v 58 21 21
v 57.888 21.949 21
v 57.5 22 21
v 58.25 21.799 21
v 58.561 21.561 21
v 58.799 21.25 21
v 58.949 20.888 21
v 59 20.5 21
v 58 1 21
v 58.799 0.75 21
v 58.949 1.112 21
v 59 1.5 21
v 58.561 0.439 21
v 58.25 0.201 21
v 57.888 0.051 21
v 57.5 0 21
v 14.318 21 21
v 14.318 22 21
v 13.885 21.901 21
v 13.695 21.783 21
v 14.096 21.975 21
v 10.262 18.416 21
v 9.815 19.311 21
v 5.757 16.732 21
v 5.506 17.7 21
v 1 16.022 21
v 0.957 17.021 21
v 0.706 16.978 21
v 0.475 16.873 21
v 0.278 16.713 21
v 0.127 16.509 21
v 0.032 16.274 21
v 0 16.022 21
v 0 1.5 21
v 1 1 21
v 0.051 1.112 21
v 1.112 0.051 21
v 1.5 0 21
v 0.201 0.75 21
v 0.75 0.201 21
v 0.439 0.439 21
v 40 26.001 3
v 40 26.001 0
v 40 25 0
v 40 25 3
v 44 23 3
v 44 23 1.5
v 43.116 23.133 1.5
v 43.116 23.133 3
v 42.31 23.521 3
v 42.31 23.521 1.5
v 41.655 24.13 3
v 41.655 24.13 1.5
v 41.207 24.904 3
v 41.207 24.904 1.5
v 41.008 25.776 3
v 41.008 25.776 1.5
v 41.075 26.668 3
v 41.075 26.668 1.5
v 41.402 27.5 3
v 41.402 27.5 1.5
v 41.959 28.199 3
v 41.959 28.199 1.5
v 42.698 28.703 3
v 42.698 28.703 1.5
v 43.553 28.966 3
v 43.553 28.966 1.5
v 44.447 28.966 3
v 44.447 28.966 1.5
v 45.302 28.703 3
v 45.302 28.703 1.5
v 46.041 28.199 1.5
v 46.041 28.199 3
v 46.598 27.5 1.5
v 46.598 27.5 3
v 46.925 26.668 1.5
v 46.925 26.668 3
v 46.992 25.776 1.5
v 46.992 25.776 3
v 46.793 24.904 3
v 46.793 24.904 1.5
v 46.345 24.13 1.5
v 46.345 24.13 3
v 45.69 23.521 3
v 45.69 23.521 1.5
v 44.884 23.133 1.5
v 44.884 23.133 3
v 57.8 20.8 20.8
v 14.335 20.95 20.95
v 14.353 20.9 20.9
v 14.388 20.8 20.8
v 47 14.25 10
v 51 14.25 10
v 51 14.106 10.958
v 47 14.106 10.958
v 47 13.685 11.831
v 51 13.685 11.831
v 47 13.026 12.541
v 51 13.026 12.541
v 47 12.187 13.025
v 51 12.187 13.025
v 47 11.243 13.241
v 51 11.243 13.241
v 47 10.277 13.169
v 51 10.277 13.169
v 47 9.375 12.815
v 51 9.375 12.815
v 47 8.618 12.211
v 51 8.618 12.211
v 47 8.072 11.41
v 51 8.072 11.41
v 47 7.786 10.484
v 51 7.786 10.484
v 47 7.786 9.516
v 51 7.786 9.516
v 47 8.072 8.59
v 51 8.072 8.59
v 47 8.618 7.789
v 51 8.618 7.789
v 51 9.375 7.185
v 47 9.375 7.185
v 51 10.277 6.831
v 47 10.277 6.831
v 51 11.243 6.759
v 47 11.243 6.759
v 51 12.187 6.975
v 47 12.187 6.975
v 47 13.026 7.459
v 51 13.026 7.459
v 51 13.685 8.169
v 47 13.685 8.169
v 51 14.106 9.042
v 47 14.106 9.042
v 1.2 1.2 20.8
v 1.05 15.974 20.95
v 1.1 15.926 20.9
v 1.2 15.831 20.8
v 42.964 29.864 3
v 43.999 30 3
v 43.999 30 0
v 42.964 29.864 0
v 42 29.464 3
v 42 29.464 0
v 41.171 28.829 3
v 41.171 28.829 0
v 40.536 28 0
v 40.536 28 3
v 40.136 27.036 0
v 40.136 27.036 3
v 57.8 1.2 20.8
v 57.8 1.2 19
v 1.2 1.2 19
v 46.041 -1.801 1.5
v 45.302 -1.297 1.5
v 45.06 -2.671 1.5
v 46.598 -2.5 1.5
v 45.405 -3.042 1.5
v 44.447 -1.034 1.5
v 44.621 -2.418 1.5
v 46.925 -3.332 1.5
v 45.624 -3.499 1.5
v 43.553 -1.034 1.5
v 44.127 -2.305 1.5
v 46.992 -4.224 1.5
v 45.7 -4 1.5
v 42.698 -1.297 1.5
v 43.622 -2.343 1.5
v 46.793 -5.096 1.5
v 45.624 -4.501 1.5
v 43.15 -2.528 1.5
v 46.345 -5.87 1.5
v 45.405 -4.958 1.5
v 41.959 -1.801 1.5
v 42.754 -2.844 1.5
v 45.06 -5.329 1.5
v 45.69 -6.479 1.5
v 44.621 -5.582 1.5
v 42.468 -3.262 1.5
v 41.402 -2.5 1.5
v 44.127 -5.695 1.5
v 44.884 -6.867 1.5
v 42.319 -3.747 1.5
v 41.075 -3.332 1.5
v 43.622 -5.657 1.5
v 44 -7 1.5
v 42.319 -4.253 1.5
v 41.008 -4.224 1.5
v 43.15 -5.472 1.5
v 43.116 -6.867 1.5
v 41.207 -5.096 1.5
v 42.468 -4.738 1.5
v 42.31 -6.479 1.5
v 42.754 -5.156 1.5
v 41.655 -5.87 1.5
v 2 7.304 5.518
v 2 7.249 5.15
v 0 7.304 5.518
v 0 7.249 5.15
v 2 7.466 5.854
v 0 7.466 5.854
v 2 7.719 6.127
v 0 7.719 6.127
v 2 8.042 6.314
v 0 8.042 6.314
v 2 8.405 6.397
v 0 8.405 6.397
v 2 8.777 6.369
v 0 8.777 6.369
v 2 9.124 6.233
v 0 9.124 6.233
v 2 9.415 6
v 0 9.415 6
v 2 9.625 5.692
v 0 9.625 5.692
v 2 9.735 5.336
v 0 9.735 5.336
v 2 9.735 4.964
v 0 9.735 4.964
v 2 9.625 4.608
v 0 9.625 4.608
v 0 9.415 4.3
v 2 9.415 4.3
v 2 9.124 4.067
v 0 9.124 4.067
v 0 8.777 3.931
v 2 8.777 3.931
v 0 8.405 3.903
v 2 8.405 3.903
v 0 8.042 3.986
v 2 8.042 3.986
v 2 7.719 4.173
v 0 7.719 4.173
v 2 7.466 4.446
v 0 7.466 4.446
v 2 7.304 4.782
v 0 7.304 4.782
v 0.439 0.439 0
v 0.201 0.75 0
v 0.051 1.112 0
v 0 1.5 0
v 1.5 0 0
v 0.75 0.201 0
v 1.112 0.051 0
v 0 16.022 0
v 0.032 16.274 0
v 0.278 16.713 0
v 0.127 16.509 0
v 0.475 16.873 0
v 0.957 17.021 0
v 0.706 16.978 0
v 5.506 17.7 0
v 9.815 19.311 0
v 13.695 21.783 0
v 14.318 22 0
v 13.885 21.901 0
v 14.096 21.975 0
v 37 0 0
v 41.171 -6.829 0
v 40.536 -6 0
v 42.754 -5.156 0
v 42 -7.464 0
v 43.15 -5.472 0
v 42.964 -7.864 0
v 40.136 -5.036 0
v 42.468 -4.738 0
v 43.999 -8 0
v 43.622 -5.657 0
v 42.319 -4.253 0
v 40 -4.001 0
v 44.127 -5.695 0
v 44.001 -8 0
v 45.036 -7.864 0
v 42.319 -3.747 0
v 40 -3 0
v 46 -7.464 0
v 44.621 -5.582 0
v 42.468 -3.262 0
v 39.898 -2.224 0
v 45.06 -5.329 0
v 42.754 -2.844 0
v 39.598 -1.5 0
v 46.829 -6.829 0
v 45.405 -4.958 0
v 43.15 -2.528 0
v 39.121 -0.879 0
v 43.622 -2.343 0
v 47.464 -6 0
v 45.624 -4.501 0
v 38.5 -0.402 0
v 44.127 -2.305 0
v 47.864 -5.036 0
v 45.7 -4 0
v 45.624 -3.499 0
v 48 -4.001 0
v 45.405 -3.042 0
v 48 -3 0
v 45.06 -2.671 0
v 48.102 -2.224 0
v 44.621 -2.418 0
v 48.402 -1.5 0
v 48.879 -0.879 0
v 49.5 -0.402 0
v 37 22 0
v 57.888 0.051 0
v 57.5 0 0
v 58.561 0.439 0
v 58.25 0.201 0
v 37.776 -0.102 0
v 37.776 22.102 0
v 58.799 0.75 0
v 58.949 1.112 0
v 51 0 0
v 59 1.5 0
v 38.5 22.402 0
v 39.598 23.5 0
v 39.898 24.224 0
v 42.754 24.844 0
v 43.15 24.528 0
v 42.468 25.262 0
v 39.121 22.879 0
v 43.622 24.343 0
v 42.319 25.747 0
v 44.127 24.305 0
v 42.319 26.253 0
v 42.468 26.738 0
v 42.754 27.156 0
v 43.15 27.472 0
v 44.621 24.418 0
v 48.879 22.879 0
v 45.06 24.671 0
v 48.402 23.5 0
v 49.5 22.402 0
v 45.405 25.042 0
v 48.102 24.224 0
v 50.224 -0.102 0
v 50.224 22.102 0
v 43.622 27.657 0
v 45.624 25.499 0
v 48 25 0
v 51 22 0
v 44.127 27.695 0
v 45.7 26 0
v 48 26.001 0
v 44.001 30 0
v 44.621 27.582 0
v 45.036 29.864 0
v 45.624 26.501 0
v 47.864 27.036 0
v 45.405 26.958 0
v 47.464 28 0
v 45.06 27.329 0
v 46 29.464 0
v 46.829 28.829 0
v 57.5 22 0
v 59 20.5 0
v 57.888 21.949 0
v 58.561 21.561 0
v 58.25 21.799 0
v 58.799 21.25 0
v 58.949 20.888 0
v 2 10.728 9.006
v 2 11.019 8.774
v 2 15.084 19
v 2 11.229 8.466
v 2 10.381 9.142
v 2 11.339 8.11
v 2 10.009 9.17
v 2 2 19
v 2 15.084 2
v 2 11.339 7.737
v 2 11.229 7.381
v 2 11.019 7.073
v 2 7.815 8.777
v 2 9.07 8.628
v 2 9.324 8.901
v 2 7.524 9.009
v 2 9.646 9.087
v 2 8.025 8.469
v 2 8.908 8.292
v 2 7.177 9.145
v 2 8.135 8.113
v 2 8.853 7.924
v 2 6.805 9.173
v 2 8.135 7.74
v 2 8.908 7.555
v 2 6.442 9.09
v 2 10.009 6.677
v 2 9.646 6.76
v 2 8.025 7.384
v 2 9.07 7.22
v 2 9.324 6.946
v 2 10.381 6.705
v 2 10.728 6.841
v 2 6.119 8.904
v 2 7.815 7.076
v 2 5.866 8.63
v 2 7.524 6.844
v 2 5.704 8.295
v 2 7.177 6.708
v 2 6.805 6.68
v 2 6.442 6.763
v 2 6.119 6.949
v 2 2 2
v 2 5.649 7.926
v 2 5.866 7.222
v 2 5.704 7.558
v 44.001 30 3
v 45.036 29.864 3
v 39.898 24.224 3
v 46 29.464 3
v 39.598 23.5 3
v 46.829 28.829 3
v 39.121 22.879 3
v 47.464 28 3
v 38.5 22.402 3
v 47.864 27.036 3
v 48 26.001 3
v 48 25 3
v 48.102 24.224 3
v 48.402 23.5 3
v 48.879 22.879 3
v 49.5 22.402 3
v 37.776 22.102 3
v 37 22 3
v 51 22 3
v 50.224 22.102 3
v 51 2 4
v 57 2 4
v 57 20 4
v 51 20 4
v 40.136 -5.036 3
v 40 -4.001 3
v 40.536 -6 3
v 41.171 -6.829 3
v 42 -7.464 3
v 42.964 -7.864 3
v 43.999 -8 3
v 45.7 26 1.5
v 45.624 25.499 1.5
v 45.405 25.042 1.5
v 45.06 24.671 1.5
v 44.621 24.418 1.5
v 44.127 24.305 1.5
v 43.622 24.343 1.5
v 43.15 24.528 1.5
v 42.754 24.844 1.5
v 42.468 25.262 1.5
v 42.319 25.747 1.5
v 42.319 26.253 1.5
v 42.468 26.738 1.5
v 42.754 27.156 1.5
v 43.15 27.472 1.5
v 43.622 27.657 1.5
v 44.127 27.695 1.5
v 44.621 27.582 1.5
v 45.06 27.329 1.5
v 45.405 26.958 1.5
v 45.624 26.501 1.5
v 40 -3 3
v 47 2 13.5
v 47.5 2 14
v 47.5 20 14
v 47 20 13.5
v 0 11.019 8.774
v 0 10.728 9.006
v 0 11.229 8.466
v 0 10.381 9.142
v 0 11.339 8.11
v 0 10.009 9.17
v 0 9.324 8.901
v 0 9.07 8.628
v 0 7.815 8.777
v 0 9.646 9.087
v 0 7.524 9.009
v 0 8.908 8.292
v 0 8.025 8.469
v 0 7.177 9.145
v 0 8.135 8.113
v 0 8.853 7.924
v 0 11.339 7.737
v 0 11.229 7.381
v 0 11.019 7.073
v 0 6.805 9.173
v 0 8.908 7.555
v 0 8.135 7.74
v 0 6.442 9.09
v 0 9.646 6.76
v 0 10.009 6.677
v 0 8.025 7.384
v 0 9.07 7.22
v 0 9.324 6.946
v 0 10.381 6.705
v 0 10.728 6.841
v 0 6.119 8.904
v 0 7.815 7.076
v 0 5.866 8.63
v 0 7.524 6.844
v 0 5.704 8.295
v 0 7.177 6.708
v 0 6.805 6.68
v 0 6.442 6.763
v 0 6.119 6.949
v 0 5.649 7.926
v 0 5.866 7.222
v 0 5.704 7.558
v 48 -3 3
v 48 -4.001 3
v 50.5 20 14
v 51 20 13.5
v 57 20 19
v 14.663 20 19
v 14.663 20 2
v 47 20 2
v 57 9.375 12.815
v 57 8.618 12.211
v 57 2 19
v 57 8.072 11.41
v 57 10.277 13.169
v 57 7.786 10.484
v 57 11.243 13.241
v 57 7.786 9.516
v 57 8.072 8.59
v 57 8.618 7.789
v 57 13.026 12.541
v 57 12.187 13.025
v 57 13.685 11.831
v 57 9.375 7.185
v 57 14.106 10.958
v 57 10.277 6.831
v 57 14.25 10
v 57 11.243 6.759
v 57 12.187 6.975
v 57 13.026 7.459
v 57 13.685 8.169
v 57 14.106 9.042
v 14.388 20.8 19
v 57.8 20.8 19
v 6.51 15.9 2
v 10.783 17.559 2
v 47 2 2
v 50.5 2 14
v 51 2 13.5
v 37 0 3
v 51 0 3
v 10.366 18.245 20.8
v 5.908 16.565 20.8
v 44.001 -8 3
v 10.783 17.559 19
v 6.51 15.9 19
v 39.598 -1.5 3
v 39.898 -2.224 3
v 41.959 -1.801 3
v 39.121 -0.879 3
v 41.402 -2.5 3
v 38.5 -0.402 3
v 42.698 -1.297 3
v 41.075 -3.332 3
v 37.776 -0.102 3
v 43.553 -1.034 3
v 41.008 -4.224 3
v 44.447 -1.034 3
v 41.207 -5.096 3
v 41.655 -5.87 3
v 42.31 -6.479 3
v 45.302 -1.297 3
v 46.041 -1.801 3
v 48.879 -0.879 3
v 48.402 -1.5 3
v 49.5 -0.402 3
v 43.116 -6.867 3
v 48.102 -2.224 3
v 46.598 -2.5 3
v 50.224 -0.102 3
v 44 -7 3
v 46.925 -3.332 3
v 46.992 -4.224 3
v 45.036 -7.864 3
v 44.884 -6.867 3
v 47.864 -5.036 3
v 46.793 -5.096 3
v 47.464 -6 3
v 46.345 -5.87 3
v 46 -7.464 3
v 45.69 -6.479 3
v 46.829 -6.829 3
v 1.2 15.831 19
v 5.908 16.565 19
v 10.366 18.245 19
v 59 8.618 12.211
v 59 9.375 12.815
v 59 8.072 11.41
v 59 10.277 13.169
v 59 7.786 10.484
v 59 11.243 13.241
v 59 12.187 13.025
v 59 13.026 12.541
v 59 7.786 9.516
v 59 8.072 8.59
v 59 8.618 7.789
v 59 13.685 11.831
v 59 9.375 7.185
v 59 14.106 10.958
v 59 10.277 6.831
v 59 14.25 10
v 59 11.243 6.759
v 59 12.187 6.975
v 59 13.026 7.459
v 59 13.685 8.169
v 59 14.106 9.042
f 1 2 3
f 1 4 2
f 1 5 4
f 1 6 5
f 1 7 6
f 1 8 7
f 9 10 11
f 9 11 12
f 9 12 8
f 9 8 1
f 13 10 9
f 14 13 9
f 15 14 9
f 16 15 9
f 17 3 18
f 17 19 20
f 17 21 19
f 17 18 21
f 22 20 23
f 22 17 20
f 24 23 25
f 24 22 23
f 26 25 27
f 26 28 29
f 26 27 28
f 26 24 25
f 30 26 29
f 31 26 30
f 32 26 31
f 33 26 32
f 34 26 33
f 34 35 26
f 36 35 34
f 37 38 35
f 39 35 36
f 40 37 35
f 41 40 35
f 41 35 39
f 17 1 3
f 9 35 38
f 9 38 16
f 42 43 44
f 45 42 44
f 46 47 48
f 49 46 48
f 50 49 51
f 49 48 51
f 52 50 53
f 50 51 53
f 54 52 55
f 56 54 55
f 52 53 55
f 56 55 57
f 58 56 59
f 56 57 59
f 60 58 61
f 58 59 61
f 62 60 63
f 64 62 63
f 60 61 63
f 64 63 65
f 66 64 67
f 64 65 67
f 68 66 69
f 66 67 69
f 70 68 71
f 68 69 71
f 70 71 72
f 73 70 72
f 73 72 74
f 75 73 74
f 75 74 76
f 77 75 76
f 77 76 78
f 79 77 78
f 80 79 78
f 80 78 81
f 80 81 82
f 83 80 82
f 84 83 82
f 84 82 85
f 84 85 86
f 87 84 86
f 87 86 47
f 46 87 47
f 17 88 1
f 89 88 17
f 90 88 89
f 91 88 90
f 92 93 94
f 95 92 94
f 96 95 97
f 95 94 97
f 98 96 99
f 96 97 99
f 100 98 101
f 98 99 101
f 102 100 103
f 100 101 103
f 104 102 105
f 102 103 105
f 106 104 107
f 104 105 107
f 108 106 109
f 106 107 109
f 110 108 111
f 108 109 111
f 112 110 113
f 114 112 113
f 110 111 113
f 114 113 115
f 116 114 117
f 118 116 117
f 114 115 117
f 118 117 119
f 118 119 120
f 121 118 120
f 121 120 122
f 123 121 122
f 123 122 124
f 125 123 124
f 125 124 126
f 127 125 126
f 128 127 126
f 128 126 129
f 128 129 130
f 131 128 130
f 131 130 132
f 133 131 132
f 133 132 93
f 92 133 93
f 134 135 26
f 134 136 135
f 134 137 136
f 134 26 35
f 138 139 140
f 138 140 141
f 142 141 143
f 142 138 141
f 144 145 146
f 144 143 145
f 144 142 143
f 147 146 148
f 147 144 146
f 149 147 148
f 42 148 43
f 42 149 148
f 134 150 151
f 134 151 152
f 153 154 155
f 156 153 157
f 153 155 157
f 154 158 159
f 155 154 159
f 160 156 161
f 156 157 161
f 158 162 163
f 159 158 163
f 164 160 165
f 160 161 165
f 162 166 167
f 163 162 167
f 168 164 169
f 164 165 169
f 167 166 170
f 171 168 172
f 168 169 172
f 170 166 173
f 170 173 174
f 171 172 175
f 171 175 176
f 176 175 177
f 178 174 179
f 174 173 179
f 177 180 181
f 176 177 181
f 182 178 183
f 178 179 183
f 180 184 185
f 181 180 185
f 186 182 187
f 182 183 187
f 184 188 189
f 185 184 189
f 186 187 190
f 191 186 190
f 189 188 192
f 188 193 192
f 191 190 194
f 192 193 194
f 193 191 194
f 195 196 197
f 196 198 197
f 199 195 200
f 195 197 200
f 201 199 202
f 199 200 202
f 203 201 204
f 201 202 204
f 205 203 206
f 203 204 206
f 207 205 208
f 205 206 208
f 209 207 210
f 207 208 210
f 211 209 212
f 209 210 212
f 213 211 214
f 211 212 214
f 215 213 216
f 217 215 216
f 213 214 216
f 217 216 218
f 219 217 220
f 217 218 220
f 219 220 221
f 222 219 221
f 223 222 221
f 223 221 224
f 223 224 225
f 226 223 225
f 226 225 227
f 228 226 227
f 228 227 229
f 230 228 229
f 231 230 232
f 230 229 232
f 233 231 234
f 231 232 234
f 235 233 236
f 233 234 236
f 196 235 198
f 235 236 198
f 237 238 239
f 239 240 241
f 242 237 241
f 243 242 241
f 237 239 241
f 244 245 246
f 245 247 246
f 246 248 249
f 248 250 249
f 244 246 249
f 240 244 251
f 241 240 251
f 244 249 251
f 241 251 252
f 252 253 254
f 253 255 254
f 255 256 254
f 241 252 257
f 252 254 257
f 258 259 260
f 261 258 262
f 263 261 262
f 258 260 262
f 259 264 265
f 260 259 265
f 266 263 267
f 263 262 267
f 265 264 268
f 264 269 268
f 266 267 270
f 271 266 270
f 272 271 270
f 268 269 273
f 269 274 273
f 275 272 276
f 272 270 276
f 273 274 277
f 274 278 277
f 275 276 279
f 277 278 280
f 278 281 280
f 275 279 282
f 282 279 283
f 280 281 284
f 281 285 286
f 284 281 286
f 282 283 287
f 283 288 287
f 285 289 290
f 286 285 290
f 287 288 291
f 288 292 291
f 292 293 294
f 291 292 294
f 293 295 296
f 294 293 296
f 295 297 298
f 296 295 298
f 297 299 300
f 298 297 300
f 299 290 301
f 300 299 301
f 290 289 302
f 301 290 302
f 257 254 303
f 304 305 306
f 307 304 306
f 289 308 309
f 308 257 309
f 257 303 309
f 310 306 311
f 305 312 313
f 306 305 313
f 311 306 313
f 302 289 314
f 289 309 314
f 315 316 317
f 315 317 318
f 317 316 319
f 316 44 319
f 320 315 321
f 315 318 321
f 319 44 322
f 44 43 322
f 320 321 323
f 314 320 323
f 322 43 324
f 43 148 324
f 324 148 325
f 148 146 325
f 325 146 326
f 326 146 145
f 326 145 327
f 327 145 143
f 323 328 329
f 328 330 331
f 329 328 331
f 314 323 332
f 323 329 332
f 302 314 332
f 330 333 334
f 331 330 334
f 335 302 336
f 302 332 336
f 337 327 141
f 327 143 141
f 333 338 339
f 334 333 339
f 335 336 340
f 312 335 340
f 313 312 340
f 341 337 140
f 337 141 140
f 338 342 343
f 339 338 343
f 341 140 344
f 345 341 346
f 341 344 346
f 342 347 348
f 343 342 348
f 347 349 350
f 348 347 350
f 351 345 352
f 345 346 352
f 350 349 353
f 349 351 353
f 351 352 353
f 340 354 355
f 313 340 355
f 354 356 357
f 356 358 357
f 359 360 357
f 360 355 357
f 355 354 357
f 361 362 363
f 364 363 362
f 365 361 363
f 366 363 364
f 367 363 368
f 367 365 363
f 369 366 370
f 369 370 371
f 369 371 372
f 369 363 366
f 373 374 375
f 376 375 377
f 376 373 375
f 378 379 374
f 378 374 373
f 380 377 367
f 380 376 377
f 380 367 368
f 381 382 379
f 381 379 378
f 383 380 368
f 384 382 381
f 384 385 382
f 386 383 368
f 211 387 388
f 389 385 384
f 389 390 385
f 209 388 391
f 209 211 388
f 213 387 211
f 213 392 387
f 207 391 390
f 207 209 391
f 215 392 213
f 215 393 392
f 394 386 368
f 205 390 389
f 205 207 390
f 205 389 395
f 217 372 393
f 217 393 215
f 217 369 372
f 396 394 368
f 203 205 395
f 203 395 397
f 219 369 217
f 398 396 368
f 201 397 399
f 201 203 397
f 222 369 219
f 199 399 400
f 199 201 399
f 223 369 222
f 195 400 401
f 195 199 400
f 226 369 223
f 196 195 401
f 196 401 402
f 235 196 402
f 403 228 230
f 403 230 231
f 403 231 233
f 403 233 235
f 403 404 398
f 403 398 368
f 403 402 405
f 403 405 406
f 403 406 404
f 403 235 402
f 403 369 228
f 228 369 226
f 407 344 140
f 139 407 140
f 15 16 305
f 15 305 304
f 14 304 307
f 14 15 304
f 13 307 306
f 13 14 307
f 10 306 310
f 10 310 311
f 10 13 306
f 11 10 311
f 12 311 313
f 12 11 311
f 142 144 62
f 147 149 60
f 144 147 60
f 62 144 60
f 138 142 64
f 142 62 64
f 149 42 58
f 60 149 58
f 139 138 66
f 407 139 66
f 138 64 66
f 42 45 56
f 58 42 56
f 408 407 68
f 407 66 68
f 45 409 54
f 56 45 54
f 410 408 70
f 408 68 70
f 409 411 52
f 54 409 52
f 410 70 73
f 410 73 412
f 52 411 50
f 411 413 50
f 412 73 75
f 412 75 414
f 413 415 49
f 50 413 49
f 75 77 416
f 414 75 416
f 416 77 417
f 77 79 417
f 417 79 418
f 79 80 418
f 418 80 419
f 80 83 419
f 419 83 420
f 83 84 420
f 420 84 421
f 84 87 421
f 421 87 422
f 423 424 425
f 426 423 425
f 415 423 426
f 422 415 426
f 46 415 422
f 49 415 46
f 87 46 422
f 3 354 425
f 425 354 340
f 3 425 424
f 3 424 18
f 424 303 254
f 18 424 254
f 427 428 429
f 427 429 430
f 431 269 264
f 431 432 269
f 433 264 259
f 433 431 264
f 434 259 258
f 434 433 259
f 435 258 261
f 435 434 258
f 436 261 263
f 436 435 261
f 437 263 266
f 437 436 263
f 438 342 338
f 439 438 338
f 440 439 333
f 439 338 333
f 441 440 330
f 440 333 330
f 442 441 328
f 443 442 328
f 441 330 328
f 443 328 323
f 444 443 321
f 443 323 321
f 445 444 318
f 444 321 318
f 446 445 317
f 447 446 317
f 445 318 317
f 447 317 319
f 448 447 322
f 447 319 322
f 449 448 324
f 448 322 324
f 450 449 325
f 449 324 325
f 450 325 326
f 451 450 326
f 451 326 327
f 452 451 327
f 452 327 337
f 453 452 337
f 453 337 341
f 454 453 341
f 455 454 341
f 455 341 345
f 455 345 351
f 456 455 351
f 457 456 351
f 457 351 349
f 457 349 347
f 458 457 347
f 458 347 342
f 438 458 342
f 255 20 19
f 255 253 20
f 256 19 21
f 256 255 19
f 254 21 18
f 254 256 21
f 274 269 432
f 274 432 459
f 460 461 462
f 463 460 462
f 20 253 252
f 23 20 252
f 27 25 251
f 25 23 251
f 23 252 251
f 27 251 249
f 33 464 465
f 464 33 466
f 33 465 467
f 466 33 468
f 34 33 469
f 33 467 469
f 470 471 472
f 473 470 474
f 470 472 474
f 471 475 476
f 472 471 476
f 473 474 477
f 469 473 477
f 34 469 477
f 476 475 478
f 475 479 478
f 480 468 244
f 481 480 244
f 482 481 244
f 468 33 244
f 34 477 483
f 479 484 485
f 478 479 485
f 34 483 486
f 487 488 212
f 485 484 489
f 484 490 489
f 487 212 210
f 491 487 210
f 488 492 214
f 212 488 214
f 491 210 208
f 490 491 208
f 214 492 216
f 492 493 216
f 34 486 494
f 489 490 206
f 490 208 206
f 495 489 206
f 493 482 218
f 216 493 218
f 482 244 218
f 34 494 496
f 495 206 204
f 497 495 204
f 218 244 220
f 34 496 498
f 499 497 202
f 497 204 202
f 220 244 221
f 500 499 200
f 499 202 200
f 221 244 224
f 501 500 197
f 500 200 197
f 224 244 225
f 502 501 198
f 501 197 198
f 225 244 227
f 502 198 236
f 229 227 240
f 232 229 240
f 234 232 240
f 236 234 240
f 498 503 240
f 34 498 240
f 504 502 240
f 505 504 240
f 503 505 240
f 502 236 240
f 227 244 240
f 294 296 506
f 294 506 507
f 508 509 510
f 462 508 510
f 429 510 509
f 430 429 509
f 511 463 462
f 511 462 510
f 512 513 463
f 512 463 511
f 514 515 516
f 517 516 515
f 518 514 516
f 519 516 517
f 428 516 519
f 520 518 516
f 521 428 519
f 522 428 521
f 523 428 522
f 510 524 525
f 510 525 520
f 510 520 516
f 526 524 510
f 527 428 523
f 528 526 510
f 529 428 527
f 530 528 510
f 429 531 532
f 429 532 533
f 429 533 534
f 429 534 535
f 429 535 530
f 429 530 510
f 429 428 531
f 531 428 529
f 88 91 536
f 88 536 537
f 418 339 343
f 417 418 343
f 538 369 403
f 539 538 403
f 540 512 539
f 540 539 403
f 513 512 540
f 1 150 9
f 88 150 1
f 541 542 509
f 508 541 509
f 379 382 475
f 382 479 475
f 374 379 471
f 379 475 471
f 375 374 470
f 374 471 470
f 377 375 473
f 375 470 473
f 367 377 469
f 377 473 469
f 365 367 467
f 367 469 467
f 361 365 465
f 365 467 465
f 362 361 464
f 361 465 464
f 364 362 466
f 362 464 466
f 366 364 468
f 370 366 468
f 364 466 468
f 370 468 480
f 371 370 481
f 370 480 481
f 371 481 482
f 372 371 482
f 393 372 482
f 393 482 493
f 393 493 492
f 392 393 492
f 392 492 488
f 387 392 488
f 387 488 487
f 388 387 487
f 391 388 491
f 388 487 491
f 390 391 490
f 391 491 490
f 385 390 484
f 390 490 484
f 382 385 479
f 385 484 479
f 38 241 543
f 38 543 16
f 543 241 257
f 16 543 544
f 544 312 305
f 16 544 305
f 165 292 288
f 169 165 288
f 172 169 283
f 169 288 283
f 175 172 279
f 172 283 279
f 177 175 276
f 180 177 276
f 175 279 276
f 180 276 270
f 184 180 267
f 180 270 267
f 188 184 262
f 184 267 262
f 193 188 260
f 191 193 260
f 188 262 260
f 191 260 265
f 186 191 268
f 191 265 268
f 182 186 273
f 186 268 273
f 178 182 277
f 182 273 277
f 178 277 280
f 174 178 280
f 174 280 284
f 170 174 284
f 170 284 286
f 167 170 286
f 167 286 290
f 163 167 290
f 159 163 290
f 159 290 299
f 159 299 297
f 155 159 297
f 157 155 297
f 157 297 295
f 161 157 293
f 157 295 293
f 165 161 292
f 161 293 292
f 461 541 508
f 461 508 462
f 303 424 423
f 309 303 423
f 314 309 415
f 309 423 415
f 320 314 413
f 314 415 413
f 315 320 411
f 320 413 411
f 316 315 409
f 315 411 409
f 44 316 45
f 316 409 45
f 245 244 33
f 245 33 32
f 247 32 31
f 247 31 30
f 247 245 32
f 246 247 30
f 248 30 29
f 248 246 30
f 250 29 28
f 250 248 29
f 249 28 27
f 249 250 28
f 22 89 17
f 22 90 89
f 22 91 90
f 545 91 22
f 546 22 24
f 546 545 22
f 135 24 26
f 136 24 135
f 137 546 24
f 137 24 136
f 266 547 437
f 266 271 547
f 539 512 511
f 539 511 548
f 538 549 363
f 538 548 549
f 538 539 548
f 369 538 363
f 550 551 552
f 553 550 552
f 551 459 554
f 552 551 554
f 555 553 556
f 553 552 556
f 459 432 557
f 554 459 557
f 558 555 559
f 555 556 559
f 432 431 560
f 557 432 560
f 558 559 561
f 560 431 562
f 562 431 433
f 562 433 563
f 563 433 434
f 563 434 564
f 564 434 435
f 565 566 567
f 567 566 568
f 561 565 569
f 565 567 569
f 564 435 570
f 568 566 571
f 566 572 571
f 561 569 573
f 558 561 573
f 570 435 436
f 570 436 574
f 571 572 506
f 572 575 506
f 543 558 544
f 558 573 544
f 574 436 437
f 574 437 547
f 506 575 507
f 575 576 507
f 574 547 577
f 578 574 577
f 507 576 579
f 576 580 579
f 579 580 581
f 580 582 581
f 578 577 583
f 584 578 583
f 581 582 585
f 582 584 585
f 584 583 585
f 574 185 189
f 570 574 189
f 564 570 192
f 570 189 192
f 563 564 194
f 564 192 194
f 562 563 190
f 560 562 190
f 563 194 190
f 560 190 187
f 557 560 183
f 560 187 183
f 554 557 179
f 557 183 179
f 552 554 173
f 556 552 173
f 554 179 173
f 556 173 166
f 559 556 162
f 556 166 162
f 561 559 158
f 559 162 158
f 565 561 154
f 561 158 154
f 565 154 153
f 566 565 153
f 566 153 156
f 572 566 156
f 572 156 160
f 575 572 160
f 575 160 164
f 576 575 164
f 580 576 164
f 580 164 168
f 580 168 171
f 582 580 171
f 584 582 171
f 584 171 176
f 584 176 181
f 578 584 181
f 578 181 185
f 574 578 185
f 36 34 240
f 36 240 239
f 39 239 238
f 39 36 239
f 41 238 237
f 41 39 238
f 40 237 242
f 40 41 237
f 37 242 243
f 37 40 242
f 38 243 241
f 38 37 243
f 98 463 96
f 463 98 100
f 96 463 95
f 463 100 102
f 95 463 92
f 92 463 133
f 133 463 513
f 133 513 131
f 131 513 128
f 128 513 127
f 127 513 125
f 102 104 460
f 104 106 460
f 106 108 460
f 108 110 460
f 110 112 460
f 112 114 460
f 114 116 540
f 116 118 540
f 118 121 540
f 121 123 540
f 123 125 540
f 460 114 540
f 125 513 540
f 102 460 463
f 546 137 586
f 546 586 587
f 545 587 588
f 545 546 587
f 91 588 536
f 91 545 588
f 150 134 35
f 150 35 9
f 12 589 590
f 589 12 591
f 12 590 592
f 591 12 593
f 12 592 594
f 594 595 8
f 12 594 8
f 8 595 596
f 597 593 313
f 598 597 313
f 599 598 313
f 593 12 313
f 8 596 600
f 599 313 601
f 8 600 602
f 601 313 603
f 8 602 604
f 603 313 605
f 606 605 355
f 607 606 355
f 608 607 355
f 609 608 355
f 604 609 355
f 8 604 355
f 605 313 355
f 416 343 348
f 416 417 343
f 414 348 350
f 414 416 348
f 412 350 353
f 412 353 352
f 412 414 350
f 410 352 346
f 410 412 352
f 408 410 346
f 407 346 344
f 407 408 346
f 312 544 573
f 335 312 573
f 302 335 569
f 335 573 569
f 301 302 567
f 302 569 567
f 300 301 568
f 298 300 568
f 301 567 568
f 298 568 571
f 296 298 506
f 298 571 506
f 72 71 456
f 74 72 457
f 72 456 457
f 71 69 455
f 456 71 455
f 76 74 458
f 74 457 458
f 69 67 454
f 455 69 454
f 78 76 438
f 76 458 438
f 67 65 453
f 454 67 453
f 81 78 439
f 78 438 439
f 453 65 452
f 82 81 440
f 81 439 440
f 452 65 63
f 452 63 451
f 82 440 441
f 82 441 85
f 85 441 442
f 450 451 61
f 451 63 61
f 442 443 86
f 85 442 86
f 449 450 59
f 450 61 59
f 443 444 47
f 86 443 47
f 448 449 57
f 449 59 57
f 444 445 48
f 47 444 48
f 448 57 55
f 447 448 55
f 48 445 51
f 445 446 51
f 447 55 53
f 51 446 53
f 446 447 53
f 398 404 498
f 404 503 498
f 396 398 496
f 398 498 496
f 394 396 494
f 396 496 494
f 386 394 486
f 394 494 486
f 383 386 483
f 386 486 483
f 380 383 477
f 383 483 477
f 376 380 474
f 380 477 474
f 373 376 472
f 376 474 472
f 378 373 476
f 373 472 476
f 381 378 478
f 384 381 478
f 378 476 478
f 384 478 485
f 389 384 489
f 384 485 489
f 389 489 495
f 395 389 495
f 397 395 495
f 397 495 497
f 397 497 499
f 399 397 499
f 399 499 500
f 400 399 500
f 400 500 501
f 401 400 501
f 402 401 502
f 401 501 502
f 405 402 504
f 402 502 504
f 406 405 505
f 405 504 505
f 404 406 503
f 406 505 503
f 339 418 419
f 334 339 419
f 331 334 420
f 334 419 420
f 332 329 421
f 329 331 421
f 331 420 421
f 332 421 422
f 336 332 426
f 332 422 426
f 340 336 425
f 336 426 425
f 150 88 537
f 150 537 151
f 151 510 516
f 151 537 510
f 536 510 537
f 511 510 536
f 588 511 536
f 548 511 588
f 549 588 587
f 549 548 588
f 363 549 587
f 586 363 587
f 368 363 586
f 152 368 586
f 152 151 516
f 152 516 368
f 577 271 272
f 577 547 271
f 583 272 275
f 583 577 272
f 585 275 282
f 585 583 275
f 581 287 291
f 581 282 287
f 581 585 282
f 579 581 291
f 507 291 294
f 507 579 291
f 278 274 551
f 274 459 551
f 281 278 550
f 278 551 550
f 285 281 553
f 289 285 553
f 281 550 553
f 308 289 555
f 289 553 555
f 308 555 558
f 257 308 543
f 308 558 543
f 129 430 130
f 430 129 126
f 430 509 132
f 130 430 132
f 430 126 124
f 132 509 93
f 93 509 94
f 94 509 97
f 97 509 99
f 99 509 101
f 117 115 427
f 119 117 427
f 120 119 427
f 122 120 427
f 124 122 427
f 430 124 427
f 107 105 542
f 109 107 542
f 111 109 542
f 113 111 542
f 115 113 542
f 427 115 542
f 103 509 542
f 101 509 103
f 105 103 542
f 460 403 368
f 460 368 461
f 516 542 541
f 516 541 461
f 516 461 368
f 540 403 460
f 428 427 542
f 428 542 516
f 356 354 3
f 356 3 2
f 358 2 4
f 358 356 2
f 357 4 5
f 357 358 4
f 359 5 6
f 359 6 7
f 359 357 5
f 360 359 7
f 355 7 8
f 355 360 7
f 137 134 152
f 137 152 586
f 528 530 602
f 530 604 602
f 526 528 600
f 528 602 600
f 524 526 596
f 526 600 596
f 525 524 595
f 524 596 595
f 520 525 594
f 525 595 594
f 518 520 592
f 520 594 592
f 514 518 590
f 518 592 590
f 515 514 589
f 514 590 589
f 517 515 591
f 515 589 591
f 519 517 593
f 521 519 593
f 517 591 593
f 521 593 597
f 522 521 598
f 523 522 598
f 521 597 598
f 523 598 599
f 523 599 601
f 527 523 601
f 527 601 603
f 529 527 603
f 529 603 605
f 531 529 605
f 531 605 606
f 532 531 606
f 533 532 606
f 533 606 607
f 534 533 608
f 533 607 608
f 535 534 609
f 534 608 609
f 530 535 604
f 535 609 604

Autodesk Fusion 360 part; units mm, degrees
sketch "Esquisse1" plane through (0, 0, 0) normal (0, 0, 1) x (1, 0, 0)
  line L0 (0, 0) -> (59, 0)
  line L1 (59, 0) -> (59, 22)
  line L2 (59, 22) -> (0, 22)
  line L3 (0, 22) -> (0, 0)
  line L4 (0, 0) -> (0, 17) construction
  line L5 (0, 17) -> (0, 39) construction
  arc A0 (0, 17) -> (13.9642, 22) centre (0, 39) ccw
  dimension "d1" = 22
  dimension "d2" = 59
  dimension "d3" = 17
  dimension "d4" = 22
extrude "Extrusion1" add sketch "Esquisse1" along normal blind 2 contours L0 L1 L2 L3 A0
sketch "Esquisse2" plane through (0, 0, 2) normal (0, 0, 1) x (-1, 0, 0)
  line L0 (0, 0) -> (-59, 0)
  line L1 (-59, 0) -> (-59, -22)
  line L2 (-59, -22) -> (-13.9642, -22)
  arc A0 (0, -17) -> (-13.9642, -22) centre (0, -39) ccw
  line L3 (0, -17) -> (0, 0)
  arc A1 (-2, -15.0835) -> (-14.6629, -20) centre (0, -39) ccw
  line L4 (-57, -20) -> (-14.6629, -20)
  line L5 (-57, -2) -> (-57, -20)
  line L6 (-2, -2) -> (-57, -2)
  line L7 (-2, -15.0835) -> (-2, -2)
  dimension "d7" = -2
extrude "Extrusion2" add sketch "Esquisse2" along normal blind 19
sketch "Esquisse3" plane through (0, 0, 0) normal (-1, 0, 0) x (0, -1, 0)
  line L0 (-17, 0) -> (0, 0)
  line L1 (0, 0) -> (0, 21)
  line L2 (0, 21) -> (-17, 21)
  line L3 (-17, 21) -> (-17, 0)
  line L4 (-17, 7) -> (0, 7) construction
  circle A0 centre (-8.5, 7) radius 1.85 construction
  circle A1 centre (-8.4986, 5.15) radius 1.25
  circle A2 centre (-6.8986, 7.9263) radius 1.25
  circle A3 centre (-10.1029, 7.9237) radius 1.25
  dimension "d11" = 7
  dimension "d12" = 3.7
  dimension "d13" = 2.5
  dimension "d15" = 360
extrude "Extrusion3" cut sketch "Esquisse3" against normal blind 2 contours A1 | A2 | A3
sketch "Esquisse5" plane through (59, 0, 0) normal (1, 0, 0) x (0, 1, 0)
  line L0 (0, 0) -> (22, 0)
  line L1 (22, 0) -> (22, 21)
  line L2 (22, 21) -> (0, 21)
  line L3 (0, 21) -> (0, 0)
  circle A0 centre (11, 10) radius 3.25
  circle A1 centre (11, 10) radius 2
  dimension "d24" = 6.5
  dimension "d28" = 11
  dimension "d29" = 10
  dimension "d36" = 4
sketch "Esquisse6" plane through (0, 0, 2) normal (0, 0, 1) x (-1, 0, 0)
  line L0 (-2, -2) -> (-57, -2)
  line L1 (-57, -2) -> (-57, -20)
  line L2 (-57, -20) -> (-14.6629, -20)
  arc A0 (-2, -15.0835) -> (-14.6629, -20) centre (0, -39) ccw
  line L3 (-2, -15.0835) -> (-2, -2)
  line L4 (-57, -20) -> (-47, -20)
  line L5 (-47, -20) -> (-47, -2)
  line L6 (-47, -2) -> (-57, -2)
  line L7 (-57, -2) -> (-57, -20)
  dimension "d25" = 10
extrude "Extrusion5" add sketch "Esquisse6" along normal blind 12 contours L0 L1 L2 L4 L5 L6 L7
extrude "Extrusion6" cut sketch "Esquisse5" against normal blind 19 contours A0 | A1
sketch "Esquisse7" plane through (0, 0, 14) normal (0, 0, 1) x (-1, 0, 0)
  line L0 (-57, -2) -> (-57, -20)
  line L1 (-57, -20) -> (-47, -20)
  line L2 (-47, -20) -> (-47, -2)
  line L3 (-57, -20) -> (-57, -2)
  line L4 (-57, -20) -> (-51, -20)
  line L5 (-51, -20) -> (-51, -2)
  line L6 (-51, -2) -> (-57, -2)
  line L7 (-57, -2) -> (-57, -20)
  line L8 (-47, -2) -> (-57, -2)
  dimension "d35" = 6
extrude "Extrusion7" cut sketch "Esquisse7" against normal blind 10 contours L0 L1 L3 L4 L5 L6 L7 L8
extrude "Extrusion8" cut sketch "Esquisse5" against normal blind 13 contours A1
sketch "Esquisse8" plane through (51, 0, 0) normal (1, 0, 0) x (0, 1, 0)
  line L0 (20, 14) -> (2, 14)
  line L1 (2, 14) -> (2, 4)
  line L2 (2, 4) -> (20, 4)
  line L3 (20, 4) -> (20, 14)
  circle A0 centre (11, 10) radius 3.25
sketch "Esquisse9" plane through (0, 0, 0) normal (0, 0, -1) x (1, 0, 0)
  line L0 (59, 0) -> (0, 0)
  line L1 (0, 0) -> (0, -17)
  arc A0 (13.9642, -22) -> (0, -17) centre (0, -39) ccw
  line L2 (13.9642, -22) -> (59, -22)
  line L3 (59, -22) -> (59, 0)
  line L4 (40, 0) -> (48, 0)
  line L5 (48, 0) -> (48, 8)
  line L6 (48, 8) -> (40, 8)
  line L7 (40, 8) -> (40, 0)
  line L8 (44, 0) -> (44, 8) construction
  line L9 (59, -11) -> (19, -11) construction
  line L10 (48, -22) -> (48, -30)
  line L11 (48, -30) -> (40, -30)
  line L12 (40, -30) -> (40, -22)
  line L13 (40, -22) -> (48, -22)
  circle A1 centre (44, 4) radius 1.7
  circle A2 centre (44, -26) radius 1.7
  dimension "d39" = 8
  dimension "d40" = 8
  dimension "d41" = 15
  dimension "d44" = 3.4
extrude "Extrusion9" add sketch "Esquisse9" against normal blind 3 contours L0 L4 L5 L6 L7 | L2 L10 L11 L12 L13
fillet "Congé1" radius 4 4 edges at (48, -8, 1.5) (40, -8, 1.5) (48, 30, 1.5) (40, 30, 1.5)
fillet "Congé2" radius 3 4 edges at (48, 0, 1.5) (48, 22, 1.5) (40, 22, 1.5) (40, 0, 1.5)
sketch "Esquisse10" plane through (0, 0, 21) normal (0, 0, 1) x (-1, 0, 0)
  line L0 (-2, -2) -> (-2, -15.0835)
  arc A0 (-2, -15.0835) -> (-14.6629, -20) centre (0, -39) ccw
  line L1 (-14.6629, -20) -> (-57, -20)
  line L2 (-57, -20) -> (-57, -2)
  line L3 (-57, -2) -> (-2, -2)
  line L4 (0, -17) -> (0, 0)
  line L5 (0, 0) -> (-59, 0)
  line L6 (-59, 0) -> (-59, -22)
  line L7 (-59, -22) -> (-13.9642, -22)
  arc A1 (0, -17) -> (-13.9642, -22) centre (0, -39) ccw
  line L8 (-57.8, -1.2) -> (-1.2, -1.2)
  line L9 (-1.2, -1.2) -> (-1.2, -15.8311)
  arc A2 (-1.2, -15.8311) -> (-14.3875, -20.8) centre (0, -39) ccw
  line L10 (-14.3875, -20.8) -> (-57.8, -20.8)
  line L11 (-57.8, -20.8) -> (-57.8, -1.2)
  dimension "d49" = -0.8
extrude "Extrusion10" cut sketch "Esquisse10" against normal blind 2 contours L8 L9 A2 L10 L11
chamfer "Chanfrein1" distance 0.2 angle 45 5 edges at (8.1802, 17.29, 21) (36.0937, 20.8, 21) (57.8, 11, 21) (29.5, 1.2, 21) (1.2, 8.5155, 21)
fillet "Congé3" radius 1.5 3 edges at (0, 0, 10.5) (59, 0, 10.5) (59, 22, 10.5)
fillet "Congé4" radius 1 2 edges at (0, 17, 10.5) (13.9642, 22, 10.5)
chamfer "Chanfrein2" distance 0.5 angle 45 2 edges at (51, 11, 14) (47, 11, 14)
hole "Perçage1" at (44, -4, 3) direction (0, 0, -1) diameter 6 depth 1.5 tip angle 180
hole "Perçage2" at (44, 26, 3) direction (0, 0, -1) diameter 6 depth 1.5 tip angle 180
